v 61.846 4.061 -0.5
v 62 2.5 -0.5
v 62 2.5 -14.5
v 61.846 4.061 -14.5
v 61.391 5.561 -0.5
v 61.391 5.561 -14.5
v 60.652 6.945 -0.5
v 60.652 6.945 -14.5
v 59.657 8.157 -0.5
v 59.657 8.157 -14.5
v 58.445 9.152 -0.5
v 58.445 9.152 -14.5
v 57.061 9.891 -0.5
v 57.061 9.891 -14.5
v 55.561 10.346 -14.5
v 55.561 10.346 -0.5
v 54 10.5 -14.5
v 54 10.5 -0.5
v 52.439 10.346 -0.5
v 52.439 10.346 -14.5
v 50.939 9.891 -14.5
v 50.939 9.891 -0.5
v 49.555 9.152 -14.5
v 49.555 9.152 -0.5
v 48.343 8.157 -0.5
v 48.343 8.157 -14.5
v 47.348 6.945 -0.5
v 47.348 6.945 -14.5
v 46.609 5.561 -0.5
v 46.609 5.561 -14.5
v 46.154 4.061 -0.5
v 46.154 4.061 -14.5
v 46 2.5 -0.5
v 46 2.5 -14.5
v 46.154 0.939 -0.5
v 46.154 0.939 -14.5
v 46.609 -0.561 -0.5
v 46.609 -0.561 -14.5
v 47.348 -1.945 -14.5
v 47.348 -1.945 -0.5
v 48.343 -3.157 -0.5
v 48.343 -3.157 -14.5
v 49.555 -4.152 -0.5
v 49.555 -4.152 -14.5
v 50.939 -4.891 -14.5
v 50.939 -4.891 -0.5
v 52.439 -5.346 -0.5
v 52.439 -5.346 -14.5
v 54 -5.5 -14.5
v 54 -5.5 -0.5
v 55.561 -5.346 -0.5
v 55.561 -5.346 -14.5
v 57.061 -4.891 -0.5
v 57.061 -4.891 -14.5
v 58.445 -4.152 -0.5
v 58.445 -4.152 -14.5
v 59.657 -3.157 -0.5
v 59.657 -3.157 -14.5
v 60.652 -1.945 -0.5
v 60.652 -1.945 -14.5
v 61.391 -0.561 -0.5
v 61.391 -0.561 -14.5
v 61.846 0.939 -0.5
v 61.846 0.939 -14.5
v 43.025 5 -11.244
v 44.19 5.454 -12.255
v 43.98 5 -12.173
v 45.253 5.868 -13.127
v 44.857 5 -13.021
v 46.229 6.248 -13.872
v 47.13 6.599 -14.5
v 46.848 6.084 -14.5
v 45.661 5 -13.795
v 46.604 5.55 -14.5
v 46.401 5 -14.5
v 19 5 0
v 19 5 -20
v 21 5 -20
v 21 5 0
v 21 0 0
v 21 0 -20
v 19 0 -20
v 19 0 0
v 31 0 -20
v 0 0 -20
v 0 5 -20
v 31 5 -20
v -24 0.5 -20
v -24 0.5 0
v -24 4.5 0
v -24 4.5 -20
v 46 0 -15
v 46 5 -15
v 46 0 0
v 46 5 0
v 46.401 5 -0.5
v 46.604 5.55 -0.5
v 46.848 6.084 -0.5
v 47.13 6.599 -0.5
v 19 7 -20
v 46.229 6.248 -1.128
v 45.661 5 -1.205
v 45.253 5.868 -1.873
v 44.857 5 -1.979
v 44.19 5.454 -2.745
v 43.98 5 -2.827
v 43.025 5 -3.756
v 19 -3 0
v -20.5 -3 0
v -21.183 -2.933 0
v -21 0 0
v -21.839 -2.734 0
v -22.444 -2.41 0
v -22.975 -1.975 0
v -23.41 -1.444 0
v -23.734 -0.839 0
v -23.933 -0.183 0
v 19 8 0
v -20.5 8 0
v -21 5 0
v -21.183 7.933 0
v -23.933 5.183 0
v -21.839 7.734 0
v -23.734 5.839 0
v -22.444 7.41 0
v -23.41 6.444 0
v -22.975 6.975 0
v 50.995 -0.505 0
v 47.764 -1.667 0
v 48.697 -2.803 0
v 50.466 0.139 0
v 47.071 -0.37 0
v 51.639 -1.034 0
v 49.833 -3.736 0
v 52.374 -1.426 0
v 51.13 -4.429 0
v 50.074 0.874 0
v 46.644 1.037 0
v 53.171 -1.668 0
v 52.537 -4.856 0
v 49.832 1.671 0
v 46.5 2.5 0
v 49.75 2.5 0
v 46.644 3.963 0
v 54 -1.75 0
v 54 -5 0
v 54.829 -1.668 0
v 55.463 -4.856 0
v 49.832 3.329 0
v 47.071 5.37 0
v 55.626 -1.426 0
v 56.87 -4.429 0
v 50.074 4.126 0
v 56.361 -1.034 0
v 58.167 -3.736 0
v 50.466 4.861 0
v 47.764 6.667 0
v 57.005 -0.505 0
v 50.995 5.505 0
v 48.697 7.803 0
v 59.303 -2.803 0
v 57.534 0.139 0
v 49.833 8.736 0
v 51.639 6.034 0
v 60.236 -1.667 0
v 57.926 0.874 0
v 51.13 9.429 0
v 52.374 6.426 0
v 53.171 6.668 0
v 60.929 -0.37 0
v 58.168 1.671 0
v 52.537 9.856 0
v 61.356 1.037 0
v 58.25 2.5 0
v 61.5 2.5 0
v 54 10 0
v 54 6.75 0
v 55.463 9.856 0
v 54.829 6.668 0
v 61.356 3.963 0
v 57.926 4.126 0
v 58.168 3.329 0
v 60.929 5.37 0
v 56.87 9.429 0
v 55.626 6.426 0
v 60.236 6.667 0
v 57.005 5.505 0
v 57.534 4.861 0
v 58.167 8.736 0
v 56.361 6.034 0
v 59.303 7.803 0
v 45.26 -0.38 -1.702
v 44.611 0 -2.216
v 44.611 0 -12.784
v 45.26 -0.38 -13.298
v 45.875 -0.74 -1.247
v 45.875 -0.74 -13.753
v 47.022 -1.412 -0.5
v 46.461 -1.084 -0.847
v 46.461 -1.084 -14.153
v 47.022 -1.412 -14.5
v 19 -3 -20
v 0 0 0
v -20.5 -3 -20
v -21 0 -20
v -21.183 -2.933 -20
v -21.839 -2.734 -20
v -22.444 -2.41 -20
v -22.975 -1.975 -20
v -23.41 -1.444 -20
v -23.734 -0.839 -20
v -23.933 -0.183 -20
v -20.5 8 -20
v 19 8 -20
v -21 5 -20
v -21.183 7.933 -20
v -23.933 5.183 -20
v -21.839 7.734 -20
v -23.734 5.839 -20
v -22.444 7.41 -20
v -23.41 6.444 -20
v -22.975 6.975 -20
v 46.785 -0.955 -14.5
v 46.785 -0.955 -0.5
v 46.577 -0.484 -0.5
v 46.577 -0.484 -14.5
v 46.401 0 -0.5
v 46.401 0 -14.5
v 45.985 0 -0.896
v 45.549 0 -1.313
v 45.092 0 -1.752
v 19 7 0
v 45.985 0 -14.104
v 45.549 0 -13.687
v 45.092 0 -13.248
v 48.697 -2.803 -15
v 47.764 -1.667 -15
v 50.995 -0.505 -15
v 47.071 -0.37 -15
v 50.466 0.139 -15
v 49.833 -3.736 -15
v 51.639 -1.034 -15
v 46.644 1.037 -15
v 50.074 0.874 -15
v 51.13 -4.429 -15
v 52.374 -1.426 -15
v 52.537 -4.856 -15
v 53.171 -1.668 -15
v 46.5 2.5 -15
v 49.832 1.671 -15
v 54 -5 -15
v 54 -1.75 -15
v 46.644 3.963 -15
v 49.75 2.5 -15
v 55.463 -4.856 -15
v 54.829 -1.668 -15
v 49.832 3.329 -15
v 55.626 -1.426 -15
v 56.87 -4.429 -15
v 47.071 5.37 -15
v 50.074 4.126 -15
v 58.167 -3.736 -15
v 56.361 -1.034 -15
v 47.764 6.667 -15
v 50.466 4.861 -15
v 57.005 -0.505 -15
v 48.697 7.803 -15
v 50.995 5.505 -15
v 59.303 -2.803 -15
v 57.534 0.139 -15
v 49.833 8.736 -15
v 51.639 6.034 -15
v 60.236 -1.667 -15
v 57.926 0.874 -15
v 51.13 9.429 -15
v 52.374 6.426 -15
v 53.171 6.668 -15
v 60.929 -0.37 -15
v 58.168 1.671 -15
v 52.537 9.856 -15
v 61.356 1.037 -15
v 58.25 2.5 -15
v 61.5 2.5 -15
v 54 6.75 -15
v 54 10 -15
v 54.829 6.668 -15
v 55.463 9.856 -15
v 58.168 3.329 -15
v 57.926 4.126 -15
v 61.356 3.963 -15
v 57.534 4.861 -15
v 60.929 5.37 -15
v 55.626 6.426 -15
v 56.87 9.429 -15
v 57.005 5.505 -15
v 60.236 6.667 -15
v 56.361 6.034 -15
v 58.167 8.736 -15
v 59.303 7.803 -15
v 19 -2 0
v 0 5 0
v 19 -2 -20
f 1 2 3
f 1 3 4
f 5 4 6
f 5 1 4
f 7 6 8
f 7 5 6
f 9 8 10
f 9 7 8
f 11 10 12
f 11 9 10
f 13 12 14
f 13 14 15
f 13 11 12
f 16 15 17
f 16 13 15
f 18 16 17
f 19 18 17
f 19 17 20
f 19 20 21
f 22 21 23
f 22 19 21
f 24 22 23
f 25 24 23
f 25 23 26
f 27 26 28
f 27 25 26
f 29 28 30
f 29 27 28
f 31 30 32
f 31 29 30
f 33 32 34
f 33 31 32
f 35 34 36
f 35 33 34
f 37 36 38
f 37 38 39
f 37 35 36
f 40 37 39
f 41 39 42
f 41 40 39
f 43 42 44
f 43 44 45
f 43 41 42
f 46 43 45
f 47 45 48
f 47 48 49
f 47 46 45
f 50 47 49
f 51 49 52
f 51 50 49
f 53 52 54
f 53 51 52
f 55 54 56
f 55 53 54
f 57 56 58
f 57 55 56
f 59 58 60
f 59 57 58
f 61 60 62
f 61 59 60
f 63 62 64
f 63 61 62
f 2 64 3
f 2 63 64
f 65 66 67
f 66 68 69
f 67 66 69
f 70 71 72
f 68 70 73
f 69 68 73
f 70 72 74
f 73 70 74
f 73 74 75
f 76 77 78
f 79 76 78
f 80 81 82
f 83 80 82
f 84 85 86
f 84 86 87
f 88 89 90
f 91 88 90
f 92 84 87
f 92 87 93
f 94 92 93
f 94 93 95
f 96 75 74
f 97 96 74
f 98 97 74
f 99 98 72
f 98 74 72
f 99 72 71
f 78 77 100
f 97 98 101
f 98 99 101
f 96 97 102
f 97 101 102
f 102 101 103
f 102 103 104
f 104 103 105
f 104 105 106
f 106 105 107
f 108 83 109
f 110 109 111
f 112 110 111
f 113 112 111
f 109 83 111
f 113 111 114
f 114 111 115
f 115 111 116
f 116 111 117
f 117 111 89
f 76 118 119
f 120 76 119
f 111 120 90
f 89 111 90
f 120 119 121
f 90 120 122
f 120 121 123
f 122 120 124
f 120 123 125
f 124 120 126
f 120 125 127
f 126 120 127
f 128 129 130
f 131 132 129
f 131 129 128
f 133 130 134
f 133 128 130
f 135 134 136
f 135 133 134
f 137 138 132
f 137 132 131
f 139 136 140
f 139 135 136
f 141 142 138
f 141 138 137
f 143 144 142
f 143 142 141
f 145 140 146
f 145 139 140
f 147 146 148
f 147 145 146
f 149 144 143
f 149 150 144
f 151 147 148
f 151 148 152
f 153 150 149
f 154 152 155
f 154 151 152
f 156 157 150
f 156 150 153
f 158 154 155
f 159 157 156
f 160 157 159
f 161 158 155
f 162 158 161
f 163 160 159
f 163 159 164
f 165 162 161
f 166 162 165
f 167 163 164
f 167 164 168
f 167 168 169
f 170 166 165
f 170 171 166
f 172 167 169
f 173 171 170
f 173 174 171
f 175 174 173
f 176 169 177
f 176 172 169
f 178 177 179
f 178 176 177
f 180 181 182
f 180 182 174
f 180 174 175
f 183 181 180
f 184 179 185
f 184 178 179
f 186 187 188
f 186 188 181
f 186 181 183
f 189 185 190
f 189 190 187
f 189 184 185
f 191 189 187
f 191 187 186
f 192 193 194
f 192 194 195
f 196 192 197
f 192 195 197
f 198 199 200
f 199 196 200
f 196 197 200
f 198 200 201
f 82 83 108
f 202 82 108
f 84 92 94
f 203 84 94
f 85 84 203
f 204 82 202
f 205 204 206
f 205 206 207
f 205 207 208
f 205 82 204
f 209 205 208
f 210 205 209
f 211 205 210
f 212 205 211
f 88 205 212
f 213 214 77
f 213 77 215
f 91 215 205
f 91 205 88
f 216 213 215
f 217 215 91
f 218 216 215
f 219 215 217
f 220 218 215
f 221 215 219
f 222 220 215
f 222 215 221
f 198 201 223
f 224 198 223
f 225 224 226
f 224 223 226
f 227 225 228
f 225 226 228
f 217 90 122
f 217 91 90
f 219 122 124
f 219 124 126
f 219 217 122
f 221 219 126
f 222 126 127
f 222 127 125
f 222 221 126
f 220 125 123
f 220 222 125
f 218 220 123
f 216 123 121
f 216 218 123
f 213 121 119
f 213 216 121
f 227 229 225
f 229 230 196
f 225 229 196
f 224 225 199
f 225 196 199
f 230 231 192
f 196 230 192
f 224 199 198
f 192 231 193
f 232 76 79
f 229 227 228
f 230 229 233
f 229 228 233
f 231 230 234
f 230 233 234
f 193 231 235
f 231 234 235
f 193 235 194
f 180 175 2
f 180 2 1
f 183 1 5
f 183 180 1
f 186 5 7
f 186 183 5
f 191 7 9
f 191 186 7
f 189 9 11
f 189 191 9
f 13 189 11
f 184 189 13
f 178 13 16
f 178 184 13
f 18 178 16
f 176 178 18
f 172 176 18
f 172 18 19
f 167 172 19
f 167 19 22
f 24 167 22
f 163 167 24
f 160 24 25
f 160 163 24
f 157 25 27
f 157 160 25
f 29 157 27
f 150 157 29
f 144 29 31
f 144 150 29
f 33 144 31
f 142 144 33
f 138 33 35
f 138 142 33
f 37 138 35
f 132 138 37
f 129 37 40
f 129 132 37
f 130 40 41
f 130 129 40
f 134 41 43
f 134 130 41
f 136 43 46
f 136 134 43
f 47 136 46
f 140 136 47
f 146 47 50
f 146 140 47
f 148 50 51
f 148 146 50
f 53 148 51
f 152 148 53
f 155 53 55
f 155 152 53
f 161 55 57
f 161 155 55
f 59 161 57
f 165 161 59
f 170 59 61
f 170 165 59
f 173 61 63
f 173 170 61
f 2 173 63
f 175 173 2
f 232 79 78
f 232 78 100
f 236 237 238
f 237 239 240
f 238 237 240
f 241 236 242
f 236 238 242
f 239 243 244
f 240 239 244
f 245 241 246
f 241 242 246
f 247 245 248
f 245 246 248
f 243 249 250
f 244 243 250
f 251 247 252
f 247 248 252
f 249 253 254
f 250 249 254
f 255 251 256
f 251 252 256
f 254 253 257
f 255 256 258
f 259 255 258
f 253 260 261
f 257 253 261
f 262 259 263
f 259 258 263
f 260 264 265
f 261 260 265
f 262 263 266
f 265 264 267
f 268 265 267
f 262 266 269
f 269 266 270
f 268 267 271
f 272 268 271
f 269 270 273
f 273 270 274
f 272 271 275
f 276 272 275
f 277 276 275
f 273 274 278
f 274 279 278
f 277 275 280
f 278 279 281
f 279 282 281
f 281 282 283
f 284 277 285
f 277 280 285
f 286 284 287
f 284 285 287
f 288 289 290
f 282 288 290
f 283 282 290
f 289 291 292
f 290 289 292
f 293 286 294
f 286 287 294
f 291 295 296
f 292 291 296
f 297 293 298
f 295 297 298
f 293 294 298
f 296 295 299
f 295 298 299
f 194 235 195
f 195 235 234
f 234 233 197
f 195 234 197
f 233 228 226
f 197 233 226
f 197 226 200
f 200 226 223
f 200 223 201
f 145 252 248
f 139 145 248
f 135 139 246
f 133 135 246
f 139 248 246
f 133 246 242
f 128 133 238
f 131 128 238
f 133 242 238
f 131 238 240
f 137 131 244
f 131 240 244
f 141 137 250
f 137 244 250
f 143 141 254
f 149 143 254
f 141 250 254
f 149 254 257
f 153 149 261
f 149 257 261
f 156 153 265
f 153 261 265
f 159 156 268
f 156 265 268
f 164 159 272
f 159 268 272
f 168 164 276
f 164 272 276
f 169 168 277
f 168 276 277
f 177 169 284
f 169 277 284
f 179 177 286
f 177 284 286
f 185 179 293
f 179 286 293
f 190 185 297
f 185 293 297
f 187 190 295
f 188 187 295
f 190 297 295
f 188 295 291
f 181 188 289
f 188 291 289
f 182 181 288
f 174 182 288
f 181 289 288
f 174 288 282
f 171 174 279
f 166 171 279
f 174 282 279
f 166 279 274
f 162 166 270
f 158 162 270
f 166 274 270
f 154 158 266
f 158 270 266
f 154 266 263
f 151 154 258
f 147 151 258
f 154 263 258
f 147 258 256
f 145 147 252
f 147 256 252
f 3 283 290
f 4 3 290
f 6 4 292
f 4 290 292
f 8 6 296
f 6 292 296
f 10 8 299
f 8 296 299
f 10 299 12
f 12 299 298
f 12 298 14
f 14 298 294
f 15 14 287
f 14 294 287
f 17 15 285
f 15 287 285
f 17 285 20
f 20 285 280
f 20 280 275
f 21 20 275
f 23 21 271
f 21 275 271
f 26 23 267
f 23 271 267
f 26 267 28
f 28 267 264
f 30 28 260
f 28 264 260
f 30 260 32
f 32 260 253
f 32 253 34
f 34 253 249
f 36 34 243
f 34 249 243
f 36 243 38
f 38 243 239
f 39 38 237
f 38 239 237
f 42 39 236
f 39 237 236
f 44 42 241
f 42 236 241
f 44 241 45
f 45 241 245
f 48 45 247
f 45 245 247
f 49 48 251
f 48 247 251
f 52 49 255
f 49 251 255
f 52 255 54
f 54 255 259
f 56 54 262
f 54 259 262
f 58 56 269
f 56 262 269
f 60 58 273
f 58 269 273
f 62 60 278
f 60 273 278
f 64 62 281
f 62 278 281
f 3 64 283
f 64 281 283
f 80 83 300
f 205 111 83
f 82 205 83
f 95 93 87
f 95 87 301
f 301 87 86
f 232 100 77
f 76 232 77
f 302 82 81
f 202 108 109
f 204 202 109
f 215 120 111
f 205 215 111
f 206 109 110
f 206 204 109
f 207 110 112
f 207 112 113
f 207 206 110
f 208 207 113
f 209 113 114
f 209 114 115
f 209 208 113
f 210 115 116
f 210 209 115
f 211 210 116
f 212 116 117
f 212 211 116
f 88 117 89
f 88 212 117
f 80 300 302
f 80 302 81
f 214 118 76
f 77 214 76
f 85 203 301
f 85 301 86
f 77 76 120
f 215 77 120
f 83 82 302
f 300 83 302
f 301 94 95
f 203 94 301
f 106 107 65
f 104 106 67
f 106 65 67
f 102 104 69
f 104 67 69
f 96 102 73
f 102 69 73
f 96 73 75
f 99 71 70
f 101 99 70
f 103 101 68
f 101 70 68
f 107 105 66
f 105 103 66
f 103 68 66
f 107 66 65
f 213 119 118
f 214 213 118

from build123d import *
from OCP.BRepAlgoAPI import BRepAlgoAPI_Cut
from OCP.TopTools import TopTools_ListOfShape

# Parameters (mm, degrees)
P_IDAT_VYSUNUT_M1_DEPTH     = 5
VYSUNOUT_TENKOST_NN_1_DEPTH = 20
ZAOBLIT1_R                  = 3.5
SKICA3_R                    = 8
P_IDAT_VYSUNUT_M2_DEPTH     = 15
SKICA7_W                    = 4.25
SKICA7_H                    = 15.001
ZKOSEN_1_SIZE               = 0.5
KOUTOV_START                = -20
KOUTOV_SVAR_1_DEPTH         = 20
KOUTOV_SVAR_1_2_DEPTH       = 20
KOUTOV_START_2              = -12.784168981
KOUTOV_SVAR_2_DEPTH         = 10.568338072
KOUTOV_START_3              = -14.500001194
KOUTOV_SVAR_2_2_DEPTH       = 14.000001194
KOUTOV_SVAR_2_3_ANGLE       = 14.364836
KOUTOV_START_4              = -11.243553316
KOUTOV_SVAR_5_DEPTH         = 7.487106972
KOUTOV_START_5              = -14.500007293
KOUTOV_SVAR_5_2_DEPTH       = 14.000007293
KOUTOV_SVAR_5_3_ANGLE       = 17.987423


with BuildPart() as part:
    # Skica1 → Přidat vysunutím1 (new body)
    with BuildSketch(Plane(origin=(0, 0, 0), x_dir=(1, 0, 0), z_dir=(0, 1, 0))):
        Polygon((0, 0), (0, 20), (31, 20), (46, 15), (46, 0), align=None)
    extrude(amount=P_IDAT_VYSUNUT_M1_DEPTH)


with BuildPart() as body_2:
    # Skica2 → Vysunout tenkostěnný1 (new body)
    with BuildSketch(Plane.XY):
        Polygon((19, 5), (-21, 5), (-21, 0), (19, 0), (19, -3), (-24, -3), (-24, 8), (19, 8), align=None)
    extrude(amount=-VYSUNOUT_TENKOST_NN_1_DEPTH)

    # Zaoblit1
    zaoblit1_edges = [body_2.edges().sort_by_distance(p)[0] for p in [
        (-24, -3, -10),
        (-24, 8, -10),
    ]]
    fillet(zaoblit1_edges, radius=ZAOBLIT1_R)


with BuildPart() as body_3:
    # Skica3 → Přidat vysunutím2 (new body)
    with BuildSketch(Plane.XY):
        with Locations((54, 2.5)):
            Circle(SKICA3_R)
    extrude(amount=-P_IDAT_VYSUNUT_M2_DEPTH)

    # Skica7 → M10 závit1 (revolve, cut)
    with BuildSketch(Plane(origin=(54, 2.5, 0), x_dir=(0, -1, 0), z_dir=(1, 0, 0))):
        with Locations((2.125, 7.5005)):
            Rectangle(SKICA7_W, SKICA7_H)
    revolve(axis=Axis((54, 2.5, 6.35), (0, 0, -1)), mode=Mode.SUBTRACT)

    # Zkosení1
    zkosen_1_edges = [body_3.edges().sort_by_distance(p)[0] for p in [
        (46, 2.5, 0),
        (46, 2.5, -15),
    ]]
    chamfer(zkosen_1_edges, length=ZKOSEN_1_SIZE)


with BuildPart() as body_4:
    # Koutový svar...1: read off the stored shape, not the designer's step
    # Koutový svar...1 outline → Koutový svar...1 (new body)
    with BuildSketch(Plane.XY.offset(KOUTOV_START)):
        Polygon((19, -2), (21, 0), (19, 0), align=None)
    extrude(amount=KOUTOV_SVAR_1_DEPTH)


with BuildPart() as body_5:
    # Koutov_ svar...1 2 outline → Koutov_ svar...1 2 (new body)
    with BuildSketch(Plane.XY.offset(KOUTOV_START)):
        Polygon((19, 5), (21, 5), (19, 7), align=None)
    extrude(amount=KOUTOV_SVAR_1_2_DEPTH)


with BuildPart() as body_6:
    # Koutový svar...2: read off the stored shape, not the designer's step
    # Koutový svar...2 outline → Koutový svar...2 (new body)
    with BuildSketch(Plane.XY.offset(KOUTOV_START_2)):
        with BuildLine():
            Line((44.611317009, 0), (47.021769698, -1.412071299))
            ThreePointArc((47.021769698, -1.412071299), (46.677098222, -0.721041686), (46.400657923, 0))
            Line((46.400657923, 0), (44.611317009, 0))
        make_face()
    extrude(amount=KOUTOV_SVAR_2_DEPTH)


with BuildPart() as koutov_svar_2_2_tool:
    # Koutov_ svar...2 2 outline → Koutov_ svar...2 2 (new body)
    with BuildSketch(Plane.XY.offset(KOUTOV_START_3)):
        with BuildLine():
            Line((44.611317009, 0), (47.021769698, -1.412071299))
            ThreePointArc((47.021769698, -1.412071299), (46.677098222, -0.721041686), (46.400657923, 0))
            Line((46.400657923, 0), (44.611317009, 0))
        make_face()
    extrude(amount=KOUTOV_SVAR_2_2_DEPTH)


with BuildPart() as body_6_1:
    add(body_6.part)


with BuildPart() as body_6_2:
    # Koutov_ svar...2 2: joined with koutov_svar_2_2_tool
    add(body_6_1.part.fuse(koutov_svar_2_2_tool.part, tol=0.00001))


with BuildPart() as koutov_svar_2_3_tool:
    # Koutov_ svar...2 3 outline → Koutov_ svar...2 3 (revolve)
    with BuildSketch(Plane(origin=(54, 2.5, 0), x_dir=(-0.9663283779143345, -0.25731200134749094, 0), z_dir=(-0.25731200134749094, 0.9663283779143345, 0))):
        Polygon((9.715830813, -12.784169187), (7.999999947, -14.500000053), (9.715830809, -14.500001194), align=None)
        Polygon((7.999999779, -0.499999779), (9.715830809, -2.215830809), (9.715830813, -0.499999779), align=None)
    revolve(axis=Axis((54, 2.5, 0), (0, 0, 1)), revolution_arc=KOUTOV_SVAR_2_3_ANGLE)


with BuildPart() as body_6_3:
    add(body_6_2.part)

    # Koutov_ svar...2 3: cut by koutov_svar_2_3_tool, with a tolerance
    koutov_svar_2_3_stock = TopTools_ListOfShape()
    koutov_svar_2_3_stock.Append(body_6_3.part.wrapped)
    koutov_svar_2_3_tools = TopTools_ListOfShape()
    koutov_svar_2_3_tools.Append(koutov_svar_2_3_tool.part.wrapped)
    koutov_svar_2_3_cut = BRepAlgoAPI_Cut()
    koutov_svar_2_3_cut.SetArguments(koutov_svar_2_3_stock)
    koutov_svar_2_3_cut.SetTools(koutov_svar_2_3_tools)
    koutov_svar_2_3_cut.SetFuzzyValue(0.00001)
    koutov_svar_2_3_cut.Build()
    add(Compound.cast(koutov_svar_2_3_cut.Shape()).solids(), mode=Mode.REPLACE)


with BuildPart() as body_7:
    # Koutový svar...5: read off the stored shape, not the designer's step
    # Koutový svar...5 outline → Koutový svar...5 (new body)
    with BuildSketch(Plane.XY.offset(KOUTOV_START_4)):
        with BuildLine():
            Line((47.129717825, 6.598685501), (43.024683777, 5))
            Line((43.024683777, 5), (46.400657923, 5))
            ThreePointArc((46.400657923, 5), (46.721163875, 5.819419327), (47.129717825, 6.598685501))
        make_face()
    extrude(amount=KOUTOV_SVAR_5_DEPTH)


with BuildPart() as koutov_svar_5_2_tool:
    # Koutov_ svar...5 2 outline → Koutov_ svar...5 2 (new body)
    with BuildSketch(Plane.XY.offset(KOUTOV_START_5)):
        with BuildLine():
            Line((47.129717825, 6.598685501), (43.024683777, 5))
            Line((43.024683777, 5), (46.400657923, 5))
            ThreePointArc((46.400657923, 5), (46.721163875, 5.819419327), (47.129717825, 6.598685501))
        make_face()
    extrude(amount=KOUTOV_SVAR_5_2_DEPTH)


with BuildPart() as body_7_1:
    add(body_7.part)


with BuildPart() as body_7_2:
    # Koutov_ svar...5 2: joined with koutov_svar_5_2_tool
    add(body_7_1.part.fuse(koutov_svar_5_2_tool.part, tol=0.00001))


with BuildPart() as koutov_svar_5_3_tool:
    # Koutov_ svar...5 3 outline → Koutov_ svar...5 3 (revolve)
    with BuildSketch(Plane(origin=(54, 2.5, 0), x_dir=(-0.8587852718698237, 0.512335687630164, 0), z_dir=(0.512335687630164, 0.8587852718698237, 0))):
        Polygon((11.256445566, -11.243554434), (7.999999649, -14.500000351), (11.25644554, -14.500007293), align=None)
        Polygon((7.999999774, -0.499999774), (11.256445558, -3.756445558), (11.256445566, -0.499999774), align=None)
    revolve(axis=Axis((54, 2.5, 0), (0, 0, 1)), revolution_arc=KOUTOV_SVAR_5_3_ANGLE)


with BuildPart() as body_7_3:
    add(body_7_2.part)

    # Koutov_ svar...5 3: cut by koutov_svar_5_3_tool, with a tolerance
    koutov_svar_5_3_stock = TopTools_ListOfShape()
    koutov_svar_5_3_stock.Append(body_7_3.part.wrapped)
    koutov_svar_5_3_tools = TopTools_ListOfShape()
    koutov_svar_5_3_tools.Append(koutov_svar_5_3_tool.part.wrapped)
    koutov_svar_5_3_cut = BRepAlgoAPI_Cut()
    koutov_svar_5_3_cut.SetArguments(koutov_svar_5_3_stock)
    koutov_svar_5_3_cut.SetTools(koutov_svar_5_3_tools)
    koutov_svar_5_3_cut.SetFuzzyValue(0.00001)
    koutov_svar_5_3_cut.Build()
    add(Compound.cast(koutov_svar_5_3_cut.Shape()).solids(), mode=Mode.REPLACE)


solid = Compound([part.part, body_2.part, body_3.part, body_4.part, body_5.part, body_6_3.part, body_7_3.part])
